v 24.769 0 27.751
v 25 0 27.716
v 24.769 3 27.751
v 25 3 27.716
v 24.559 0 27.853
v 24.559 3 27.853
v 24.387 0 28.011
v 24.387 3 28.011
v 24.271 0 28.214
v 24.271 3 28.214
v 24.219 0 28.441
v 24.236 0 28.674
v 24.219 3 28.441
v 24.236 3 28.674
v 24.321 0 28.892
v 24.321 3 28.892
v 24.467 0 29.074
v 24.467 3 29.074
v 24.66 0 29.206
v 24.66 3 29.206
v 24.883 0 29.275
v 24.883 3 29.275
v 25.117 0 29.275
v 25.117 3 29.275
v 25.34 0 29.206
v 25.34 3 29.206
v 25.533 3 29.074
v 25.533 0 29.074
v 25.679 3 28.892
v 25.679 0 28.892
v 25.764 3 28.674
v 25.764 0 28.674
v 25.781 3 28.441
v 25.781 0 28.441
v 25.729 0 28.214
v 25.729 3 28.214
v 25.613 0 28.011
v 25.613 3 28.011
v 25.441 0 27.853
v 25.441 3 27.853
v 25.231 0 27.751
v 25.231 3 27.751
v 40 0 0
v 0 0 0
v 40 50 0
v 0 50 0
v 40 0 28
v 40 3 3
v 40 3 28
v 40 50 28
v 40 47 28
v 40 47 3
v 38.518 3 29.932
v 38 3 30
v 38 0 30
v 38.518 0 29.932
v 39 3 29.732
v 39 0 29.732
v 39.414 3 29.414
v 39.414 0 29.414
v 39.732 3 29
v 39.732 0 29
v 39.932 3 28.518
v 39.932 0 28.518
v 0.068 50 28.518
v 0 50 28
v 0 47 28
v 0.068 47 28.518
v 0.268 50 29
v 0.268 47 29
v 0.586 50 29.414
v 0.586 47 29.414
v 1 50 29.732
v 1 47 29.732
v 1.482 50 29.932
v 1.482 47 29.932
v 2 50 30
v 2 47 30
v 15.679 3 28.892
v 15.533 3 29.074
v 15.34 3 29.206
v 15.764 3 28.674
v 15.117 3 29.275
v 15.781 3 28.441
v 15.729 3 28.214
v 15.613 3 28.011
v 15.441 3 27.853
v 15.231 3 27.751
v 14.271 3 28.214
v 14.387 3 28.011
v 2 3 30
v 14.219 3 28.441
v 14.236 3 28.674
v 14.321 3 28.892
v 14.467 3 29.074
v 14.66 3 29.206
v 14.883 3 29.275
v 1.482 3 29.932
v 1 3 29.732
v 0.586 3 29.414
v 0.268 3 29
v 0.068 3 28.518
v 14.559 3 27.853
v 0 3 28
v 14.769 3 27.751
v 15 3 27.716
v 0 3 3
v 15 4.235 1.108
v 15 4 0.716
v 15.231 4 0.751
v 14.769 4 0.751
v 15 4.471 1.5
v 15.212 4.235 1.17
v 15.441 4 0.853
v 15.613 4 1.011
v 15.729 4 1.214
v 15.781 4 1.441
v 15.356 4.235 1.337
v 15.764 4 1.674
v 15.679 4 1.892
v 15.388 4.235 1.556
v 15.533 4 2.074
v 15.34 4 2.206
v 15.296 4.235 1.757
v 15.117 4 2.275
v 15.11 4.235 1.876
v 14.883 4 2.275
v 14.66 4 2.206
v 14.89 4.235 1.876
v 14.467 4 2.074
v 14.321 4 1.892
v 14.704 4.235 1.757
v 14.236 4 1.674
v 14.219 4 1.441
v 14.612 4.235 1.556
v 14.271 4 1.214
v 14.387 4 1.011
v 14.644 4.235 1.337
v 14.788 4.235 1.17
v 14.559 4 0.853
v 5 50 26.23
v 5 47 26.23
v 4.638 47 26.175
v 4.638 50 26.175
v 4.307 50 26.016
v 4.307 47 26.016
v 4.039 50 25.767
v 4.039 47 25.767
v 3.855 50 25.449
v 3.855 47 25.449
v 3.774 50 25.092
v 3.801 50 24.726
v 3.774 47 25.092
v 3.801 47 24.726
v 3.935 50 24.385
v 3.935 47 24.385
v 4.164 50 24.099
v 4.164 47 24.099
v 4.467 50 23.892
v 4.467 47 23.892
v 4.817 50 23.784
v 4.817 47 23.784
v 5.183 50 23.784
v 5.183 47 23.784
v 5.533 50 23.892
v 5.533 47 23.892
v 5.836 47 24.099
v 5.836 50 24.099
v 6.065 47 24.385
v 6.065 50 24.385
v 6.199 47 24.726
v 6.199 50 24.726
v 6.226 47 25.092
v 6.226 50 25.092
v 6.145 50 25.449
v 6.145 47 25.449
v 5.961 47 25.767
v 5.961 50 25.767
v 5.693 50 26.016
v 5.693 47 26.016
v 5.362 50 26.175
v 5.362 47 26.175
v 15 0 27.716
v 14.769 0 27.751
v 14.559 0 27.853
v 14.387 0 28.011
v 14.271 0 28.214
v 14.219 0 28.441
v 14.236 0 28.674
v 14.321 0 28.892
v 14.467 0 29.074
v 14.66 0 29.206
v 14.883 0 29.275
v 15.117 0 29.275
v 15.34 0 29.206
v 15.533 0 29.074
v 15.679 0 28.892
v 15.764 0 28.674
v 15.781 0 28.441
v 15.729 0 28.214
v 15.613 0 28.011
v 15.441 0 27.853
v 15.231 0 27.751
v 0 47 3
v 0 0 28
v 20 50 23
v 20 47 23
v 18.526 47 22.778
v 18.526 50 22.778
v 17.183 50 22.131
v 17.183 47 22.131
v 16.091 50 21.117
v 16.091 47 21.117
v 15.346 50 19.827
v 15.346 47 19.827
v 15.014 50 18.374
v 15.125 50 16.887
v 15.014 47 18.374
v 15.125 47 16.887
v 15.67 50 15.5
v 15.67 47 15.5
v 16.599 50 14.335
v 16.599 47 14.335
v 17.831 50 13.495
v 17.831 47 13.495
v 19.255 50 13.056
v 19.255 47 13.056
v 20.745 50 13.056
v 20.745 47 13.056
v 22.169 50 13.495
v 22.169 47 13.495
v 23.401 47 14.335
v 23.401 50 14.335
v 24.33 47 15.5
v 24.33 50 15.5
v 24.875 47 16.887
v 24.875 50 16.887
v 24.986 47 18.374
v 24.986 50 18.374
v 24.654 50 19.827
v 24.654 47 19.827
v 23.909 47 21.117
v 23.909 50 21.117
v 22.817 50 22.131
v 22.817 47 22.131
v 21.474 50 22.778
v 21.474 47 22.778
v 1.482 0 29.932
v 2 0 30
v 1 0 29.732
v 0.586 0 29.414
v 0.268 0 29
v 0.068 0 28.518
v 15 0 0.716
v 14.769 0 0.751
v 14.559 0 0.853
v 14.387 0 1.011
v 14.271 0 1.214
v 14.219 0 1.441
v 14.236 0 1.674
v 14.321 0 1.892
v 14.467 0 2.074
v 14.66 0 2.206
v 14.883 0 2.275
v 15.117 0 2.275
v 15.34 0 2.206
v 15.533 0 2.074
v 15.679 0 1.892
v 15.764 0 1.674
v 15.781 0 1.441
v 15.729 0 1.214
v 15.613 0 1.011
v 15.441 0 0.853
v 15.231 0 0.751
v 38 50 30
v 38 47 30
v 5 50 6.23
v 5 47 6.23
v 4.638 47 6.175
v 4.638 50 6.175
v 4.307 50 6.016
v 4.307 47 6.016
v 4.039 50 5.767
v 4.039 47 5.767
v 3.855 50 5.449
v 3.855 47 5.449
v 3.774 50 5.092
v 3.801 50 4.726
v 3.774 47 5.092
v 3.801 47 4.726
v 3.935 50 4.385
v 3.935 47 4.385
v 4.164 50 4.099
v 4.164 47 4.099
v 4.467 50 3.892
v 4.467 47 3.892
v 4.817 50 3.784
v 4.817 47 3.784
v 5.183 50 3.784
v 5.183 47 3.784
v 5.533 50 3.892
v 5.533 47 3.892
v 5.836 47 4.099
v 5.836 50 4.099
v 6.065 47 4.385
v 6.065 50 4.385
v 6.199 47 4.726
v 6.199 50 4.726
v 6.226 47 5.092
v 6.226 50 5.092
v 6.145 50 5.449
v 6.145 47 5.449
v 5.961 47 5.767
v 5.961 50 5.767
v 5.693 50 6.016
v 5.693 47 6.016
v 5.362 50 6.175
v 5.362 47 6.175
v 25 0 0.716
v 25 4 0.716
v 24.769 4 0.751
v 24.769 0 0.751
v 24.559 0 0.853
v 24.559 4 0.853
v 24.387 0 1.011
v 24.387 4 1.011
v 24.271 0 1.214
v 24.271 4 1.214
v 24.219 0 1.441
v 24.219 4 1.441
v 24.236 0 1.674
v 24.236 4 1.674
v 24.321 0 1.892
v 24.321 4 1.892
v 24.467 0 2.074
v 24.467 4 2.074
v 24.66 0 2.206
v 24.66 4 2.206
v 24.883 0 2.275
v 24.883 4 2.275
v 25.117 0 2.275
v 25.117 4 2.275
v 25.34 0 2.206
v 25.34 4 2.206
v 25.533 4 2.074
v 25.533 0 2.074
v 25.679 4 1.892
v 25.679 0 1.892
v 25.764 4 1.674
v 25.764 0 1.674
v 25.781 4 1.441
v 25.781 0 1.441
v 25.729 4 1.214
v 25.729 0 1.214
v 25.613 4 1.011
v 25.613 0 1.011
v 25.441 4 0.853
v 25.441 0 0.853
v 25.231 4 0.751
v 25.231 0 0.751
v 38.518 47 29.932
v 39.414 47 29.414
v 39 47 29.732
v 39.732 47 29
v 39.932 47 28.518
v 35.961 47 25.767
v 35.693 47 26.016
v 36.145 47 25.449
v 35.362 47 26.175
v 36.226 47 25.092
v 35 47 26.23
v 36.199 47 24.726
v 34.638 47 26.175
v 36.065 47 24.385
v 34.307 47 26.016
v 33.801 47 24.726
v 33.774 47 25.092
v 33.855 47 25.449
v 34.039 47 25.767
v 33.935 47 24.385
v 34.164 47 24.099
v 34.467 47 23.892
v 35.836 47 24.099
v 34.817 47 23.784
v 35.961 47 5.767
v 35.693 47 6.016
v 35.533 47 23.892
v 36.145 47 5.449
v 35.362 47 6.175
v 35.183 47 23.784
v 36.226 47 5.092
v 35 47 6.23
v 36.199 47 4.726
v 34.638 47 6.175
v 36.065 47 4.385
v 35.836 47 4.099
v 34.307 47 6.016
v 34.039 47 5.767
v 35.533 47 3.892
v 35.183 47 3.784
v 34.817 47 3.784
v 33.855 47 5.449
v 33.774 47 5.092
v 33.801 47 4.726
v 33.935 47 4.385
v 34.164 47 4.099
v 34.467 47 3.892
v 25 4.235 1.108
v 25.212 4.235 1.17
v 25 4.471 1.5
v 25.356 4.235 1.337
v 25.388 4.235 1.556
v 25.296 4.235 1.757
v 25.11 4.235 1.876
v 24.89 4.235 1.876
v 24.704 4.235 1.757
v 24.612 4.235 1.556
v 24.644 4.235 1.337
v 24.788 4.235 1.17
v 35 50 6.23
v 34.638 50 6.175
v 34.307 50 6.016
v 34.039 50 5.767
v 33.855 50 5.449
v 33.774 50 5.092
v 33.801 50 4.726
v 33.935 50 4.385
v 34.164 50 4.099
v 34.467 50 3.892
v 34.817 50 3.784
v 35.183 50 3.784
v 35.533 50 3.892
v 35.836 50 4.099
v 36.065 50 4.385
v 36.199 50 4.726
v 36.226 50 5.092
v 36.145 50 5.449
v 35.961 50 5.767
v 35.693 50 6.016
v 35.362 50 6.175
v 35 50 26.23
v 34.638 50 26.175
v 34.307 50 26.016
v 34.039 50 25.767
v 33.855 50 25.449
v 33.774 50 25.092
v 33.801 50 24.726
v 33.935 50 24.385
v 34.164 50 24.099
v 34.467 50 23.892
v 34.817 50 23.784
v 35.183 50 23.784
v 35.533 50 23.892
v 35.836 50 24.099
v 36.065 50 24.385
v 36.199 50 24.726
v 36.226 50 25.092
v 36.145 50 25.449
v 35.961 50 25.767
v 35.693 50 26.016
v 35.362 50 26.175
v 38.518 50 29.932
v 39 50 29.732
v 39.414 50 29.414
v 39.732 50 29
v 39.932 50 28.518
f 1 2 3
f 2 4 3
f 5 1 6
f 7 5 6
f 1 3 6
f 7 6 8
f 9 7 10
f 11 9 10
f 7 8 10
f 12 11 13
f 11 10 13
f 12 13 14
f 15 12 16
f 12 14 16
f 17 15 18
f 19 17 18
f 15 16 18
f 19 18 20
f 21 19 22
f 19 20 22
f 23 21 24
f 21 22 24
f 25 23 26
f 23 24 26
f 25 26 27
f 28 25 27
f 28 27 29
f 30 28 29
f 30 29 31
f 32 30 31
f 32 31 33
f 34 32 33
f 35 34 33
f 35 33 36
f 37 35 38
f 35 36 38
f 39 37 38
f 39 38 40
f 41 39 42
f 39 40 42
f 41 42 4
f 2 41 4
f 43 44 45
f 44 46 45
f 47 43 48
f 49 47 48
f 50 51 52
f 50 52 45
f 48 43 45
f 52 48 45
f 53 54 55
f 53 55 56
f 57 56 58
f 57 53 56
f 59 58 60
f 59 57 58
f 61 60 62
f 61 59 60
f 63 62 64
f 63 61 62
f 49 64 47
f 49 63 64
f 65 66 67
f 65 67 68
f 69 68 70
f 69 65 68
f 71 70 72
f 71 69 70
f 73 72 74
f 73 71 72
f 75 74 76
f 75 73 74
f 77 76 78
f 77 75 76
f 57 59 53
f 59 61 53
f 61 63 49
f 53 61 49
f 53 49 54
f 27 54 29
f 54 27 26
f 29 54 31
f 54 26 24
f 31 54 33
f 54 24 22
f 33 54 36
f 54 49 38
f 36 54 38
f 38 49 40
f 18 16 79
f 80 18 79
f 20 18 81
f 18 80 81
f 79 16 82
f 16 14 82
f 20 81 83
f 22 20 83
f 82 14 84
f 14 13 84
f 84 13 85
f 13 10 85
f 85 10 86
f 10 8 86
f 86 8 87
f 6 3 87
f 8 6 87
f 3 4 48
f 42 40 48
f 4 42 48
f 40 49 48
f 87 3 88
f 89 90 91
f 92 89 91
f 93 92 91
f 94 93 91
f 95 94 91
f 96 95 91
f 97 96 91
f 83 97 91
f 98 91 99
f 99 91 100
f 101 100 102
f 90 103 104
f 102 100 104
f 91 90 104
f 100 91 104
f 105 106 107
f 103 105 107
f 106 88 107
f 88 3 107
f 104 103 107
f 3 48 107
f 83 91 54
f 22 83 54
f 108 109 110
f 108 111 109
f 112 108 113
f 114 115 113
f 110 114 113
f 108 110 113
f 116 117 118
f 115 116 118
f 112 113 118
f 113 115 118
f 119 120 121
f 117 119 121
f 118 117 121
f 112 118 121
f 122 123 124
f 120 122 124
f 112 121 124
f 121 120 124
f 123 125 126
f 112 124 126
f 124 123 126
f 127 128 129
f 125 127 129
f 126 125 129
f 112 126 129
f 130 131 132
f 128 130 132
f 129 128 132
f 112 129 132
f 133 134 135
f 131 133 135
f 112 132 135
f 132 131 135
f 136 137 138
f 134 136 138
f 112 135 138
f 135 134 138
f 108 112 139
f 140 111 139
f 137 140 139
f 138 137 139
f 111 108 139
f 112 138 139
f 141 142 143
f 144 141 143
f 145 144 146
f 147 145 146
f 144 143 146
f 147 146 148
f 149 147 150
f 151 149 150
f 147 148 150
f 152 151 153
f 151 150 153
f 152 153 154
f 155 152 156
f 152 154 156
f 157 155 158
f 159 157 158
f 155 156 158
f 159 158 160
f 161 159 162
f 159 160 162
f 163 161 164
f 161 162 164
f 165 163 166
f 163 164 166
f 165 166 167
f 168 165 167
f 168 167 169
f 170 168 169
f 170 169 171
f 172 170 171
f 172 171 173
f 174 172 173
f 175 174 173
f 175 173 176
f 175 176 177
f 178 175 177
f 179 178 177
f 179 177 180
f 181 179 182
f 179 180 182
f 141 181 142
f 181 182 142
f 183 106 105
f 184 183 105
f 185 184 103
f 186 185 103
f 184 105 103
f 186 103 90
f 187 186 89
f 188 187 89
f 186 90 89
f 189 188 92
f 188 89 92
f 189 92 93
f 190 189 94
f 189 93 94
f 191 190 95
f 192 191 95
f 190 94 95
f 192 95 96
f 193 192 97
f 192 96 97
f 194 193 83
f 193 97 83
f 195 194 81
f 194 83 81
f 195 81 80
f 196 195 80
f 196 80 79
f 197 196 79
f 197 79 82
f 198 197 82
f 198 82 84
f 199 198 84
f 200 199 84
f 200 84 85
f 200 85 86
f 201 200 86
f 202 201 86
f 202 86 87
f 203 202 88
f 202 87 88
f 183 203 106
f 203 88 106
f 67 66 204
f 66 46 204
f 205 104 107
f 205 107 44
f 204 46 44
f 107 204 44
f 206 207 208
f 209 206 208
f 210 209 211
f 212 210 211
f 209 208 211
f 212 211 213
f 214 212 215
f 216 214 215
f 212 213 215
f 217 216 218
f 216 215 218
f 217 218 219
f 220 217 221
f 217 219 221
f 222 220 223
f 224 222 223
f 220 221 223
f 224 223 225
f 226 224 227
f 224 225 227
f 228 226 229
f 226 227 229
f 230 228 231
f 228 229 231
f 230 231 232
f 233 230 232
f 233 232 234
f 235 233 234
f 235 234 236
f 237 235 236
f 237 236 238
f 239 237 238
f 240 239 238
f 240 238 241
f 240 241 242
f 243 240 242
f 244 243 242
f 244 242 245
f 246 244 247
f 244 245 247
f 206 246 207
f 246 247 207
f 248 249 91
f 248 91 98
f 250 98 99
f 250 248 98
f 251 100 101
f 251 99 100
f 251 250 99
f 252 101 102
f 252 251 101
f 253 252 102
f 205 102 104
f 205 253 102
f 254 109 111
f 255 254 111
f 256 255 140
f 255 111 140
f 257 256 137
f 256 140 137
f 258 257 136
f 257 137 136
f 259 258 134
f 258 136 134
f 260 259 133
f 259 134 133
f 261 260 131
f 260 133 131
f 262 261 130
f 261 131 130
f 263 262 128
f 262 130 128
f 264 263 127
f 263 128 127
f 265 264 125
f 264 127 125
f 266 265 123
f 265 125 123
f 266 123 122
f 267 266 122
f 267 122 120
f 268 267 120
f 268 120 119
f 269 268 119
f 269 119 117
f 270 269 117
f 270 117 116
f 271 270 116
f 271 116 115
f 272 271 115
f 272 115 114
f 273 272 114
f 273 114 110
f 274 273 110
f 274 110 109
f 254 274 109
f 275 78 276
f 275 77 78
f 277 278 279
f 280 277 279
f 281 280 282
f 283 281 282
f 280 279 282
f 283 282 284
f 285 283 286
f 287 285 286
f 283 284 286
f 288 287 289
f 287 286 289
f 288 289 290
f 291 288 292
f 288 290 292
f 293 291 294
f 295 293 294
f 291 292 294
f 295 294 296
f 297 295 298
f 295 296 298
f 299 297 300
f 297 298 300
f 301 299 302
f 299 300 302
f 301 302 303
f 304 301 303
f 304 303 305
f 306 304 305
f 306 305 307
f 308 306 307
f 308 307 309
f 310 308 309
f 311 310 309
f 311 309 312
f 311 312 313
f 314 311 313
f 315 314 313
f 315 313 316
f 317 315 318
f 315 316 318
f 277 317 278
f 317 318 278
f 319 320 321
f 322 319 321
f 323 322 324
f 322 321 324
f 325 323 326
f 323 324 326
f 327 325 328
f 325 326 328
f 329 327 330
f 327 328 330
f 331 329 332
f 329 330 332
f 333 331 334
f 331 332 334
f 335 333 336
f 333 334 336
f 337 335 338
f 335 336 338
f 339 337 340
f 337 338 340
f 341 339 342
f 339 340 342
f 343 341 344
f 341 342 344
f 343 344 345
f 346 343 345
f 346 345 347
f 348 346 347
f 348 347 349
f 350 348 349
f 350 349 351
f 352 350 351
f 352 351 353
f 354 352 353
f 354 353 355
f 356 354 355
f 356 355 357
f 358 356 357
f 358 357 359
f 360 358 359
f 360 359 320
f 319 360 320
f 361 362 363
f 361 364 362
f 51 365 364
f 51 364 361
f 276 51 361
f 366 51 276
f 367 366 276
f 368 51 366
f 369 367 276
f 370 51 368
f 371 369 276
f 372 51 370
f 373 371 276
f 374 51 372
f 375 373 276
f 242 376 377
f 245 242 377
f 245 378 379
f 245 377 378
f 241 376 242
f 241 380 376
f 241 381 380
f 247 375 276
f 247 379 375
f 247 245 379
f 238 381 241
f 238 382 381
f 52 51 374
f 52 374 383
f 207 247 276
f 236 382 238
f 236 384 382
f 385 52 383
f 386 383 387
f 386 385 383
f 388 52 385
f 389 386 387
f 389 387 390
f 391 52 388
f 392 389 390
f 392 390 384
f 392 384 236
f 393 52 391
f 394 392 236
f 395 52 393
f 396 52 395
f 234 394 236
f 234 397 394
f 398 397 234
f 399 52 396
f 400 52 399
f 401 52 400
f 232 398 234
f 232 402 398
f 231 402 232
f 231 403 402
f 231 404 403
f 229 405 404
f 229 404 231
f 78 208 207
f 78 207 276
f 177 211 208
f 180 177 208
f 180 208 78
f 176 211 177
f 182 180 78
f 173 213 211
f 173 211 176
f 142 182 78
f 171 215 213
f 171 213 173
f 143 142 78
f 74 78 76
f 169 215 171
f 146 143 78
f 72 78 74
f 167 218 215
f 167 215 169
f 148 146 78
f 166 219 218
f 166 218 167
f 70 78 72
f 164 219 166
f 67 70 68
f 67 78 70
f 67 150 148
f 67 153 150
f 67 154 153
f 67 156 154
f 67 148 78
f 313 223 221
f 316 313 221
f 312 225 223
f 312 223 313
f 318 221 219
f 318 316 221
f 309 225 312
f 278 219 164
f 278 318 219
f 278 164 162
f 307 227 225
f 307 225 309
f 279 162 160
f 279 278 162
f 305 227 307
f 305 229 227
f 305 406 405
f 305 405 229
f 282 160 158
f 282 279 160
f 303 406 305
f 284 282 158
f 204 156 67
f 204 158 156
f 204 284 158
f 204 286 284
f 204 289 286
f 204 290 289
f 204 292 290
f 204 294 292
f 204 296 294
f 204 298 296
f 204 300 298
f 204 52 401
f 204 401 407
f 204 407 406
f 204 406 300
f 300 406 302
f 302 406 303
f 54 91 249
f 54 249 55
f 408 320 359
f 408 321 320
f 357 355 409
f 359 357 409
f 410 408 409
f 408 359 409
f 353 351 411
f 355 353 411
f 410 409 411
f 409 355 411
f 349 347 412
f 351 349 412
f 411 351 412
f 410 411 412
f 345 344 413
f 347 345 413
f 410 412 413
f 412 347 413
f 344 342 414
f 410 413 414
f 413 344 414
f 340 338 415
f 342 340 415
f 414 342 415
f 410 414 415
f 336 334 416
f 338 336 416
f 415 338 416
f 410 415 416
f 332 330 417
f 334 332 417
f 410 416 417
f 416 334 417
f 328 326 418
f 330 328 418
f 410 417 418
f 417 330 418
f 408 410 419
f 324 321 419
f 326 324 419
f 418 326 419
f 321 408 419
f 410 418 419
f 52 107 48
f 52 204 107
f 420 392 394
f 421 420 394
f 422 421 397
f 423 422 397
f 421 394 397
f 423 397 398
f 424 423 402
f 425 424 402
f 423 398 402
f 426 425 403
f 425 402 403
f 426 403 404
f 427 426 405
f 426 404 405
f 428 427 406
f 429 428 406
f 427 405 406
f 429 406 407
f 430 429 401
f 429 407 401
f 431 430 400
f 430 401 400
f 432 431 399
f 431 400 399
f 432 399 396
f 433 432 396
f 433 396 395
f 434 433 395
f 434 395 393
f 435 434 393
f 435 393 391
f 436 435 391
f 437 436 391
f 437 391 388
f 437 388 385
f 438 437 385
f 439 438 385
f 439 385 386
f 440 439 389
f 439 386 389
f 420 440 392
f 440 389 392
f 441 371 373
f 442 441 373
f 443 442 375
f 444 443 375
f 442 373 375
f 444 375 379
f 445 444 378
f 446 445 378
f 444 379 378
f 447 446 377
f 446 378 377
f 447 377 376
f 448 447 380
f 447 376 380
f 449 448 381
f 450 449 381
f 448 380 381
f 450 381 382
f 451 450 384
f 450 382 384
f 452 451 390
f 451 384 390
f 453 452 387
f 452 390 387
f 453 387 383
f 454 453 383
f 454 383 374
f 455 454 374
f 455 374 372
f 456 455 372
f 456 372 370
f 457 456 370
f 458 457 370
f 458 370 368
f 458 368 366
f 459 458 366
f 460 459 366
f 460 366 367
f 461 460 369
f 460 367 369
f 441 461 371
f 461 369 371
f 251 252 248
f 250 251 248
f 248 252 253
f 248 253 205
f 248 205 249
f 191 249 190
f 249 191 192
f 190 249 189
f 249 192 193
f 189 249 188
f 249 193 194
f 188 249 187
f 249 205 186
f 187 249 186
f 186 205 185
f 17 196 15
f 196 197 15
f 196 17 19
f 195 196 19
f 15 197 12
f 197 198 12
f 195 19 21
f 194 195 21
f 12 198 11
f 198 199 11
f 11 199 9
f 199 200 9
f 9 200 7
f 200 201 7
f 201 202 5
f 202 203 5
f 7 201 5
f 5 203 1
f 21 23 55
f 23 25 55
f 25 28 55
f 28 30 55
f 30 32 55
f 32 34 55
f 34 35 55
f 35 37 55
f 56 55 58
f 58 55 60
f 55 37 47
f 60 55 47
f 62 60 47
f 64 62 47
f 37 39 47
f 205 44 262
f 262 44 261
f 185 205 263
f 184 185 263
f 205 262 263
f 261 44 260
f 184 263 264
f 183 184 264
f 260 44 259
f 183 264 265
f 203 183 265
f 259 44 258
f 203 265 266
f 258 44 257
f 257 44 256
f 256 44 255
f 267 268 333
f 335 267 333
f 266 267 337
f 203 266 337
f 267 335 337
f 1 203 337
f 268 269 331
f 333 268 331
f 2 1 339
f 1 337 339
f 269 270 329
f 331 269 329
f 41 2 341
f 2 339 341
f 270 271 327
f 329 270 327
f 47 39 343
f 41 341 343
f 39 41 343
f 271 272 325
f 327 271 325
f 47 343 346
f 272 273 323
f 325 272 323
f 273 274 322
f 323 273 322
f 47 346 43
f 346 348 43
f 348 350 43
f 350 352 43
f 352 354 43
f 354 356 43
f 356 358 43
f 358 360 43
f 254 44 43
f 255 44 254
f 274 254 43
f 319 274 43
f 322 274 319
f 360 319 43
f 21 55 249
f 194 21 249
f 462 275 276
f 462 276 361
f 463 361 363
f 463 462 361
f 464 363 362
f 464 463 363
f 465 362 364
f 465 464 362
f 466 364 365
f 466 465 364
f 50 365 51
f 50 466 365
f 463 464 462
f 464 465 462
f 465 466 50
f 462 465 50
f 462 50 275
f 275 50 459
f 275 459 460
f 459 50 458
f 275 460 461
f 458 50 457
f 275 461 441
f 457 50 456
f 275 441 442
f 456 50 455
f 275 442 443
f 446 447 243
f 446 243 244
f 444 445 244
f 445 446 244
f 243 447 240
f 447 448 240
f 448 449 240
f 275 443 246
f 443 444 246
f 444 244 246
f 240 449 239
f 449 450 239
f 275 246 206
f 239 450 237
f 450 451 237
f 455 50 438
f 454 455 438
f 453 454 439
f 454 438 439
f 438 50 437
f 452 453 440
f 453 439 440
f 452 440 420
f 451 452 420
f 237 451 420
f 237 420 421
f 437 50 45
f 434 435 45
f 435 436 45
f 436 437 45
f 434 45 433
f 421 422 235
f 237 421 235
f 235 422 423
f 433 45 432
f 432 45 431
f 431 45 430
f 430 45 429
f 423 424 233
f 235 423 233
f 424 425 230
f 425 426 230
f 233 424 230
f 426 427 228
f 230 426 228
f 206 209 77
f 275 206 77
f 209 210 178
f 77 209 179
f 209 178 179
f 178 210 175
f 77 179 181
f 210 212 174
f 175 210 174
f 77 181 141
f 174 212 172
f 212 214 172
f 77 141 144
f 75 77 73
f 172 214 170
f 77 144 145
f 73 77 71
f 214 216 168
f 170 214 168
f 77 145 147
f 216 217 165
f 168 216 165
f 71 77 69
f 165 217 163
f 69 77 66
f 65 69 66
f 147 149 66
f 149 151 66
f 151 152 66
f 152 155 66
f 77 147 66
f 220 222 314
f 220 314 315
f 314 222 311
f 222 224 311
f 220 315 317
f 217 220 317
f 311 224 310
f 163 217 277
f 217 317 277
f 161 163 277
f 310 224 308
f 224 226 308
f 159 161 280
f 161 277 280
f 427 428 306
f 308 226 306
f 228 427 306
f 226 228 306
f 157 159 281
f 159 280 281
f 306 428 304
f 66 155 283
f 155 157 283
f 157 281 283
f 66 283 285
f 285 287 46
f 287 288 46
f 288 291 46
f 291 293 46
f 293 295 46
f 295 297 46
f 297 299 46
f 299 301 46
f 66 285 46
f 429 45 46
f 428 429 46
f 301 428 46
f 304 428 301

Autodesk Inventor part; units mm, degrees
ref_plane "YZ Plane" through (0, 0, 0) normal (1, 0, 0) x (0, 1, 0)
ref_plane "XZ Plane" through (0, 0, 0) normal (0, 1, 0) x (-1, 0, 0)
ref_plane "XY Plane" through (0, 0, 0) normal (0, 0, 1) x (1, 0, 0)
sketch "スケッチ1" plane through (0, 0, 0) normal (0, 0, 1) x (1, 0, 0)
  line L0 (0, 0) -> (40, 0)
  line L1 (40, 0) -> (40, 50)
  line L2 (40, 50) -> (0, 50)
  line L3 (0, 50) -> (0, 0)
  dimension "d0" = 40
  dimension "d1" = 50
extrude "押し出し1" add sketch "スケッチ1" along normal blind 3
sketch "スケッチ2" plane through (0, 0, 3) normal (0, 0, 1) x (1, 0, 0)
  line L0 (40, 50) -> (0, 50) projected
  line L1 (40, 0) -> (40, 50) projected
  line L2 (0, 50) -> (40, 50)
  line L3 (40, 50) -> (40, 47)
  line L4 (40, 47) -> (0, 47)
  line L5 (0, 47) -> (0, 50)
  line L6 (0, 50) -> (0, 0) projected
  line L7 (0, 0) -> (40, 0)
  line L8 (40, 0) -> (40, 3)
  line L9 (40, 3) -> (0, 3)
  line L10 (0, 3) -> (0, 0)
  point P0 (0, 3)
  dimension "d5" = 3
  dimension "d6" = 3
extrude "押し出し2" add sketch "スケッチ2" along normal blind 27 contours L1 L4 L5 L0 | L1 L7 L6 L9
sketch "スケッチ3" plane through (0, 50, 0) normal (0, 1, 0) x (1, 0, 0)
  line L0 (0, 0) -> (0, -30) projected
  line L1 (40, 0) -> (0, 0) projected
  point P0 (20, -18)
  dimension "d9" = 20
  dimension "d10" = 18
hole "穴1" at (20, 50, 18) direction (0, -1, 0) diameter 10 depth 3
sketch "スケッチ5" plane through (0, 0, 0) normal (0, -1, 0) x (1, 0, 0)
  line L0 (40, 0) -> (40, 30) projected
  line L1 (40, 15) -> (0, 15)
  line L2 (0, 3) -> (0, 30) projected
  line L3 (0, 0) -> (40, 0) projected
  line L4 (20, 0) -> (20, 30)
  line L5 (0, 30) -> (40, 30) projected
  point P0 (25, 1.5)
  point P1 (15, 1.5)
  point P2 (25, 28.5)
  point P3 (15, 28.5)
  dimension "d18" = 10
  dimension "d19" = 27
hole "穴2" at (25, 0, 1.5) at (15, 0, 1.5) at (25, 0, 28.5) at (15, 0, 28.5) direction (0, 1, 0) diameter 1.567 depth 4 tip angle 118 thread size "M2x0.4" class "6H" standard "ISO Metric profile"
sketch "スケッチ6" plane through (0, 50, 0) normal (0, 1, 0) x (1, 0, 0)
  line L0 (40, 0) -> (0, 0) projected
  line L1 (20, 0) -> (20, -30)
  line L2 (40, -30) -> (0, -30) projected
  line L3 (0, 0) -> (0, -30) projected
  line L4 (0, -15) -> (40, -15)
  line L5 (40, 0) -> (40, -30) projected
  point P0 (5, -5)
  point P1 (35, -5)
  point P2 (5, -25)
  point P3 (35, -25)
  dimension "d27" = 20
  dimension "d28" = 30
hole "穴3" at (5, 50, 5) at (35, 50, 5) at (5, 50, 25) at (35, 50, 25) direction (0, -1, 0) diameter 2.459 depth 3 thread size "M3x0.5" class "6H" standard "ISO Metric profile"
fillet "フィレット1" radius 2 4 edges at (0, 48.5, 30) (0, 1.5, 30) (40, 48.5, 30) (40, 1.5, 30)
properties part number "arm" material "アルミニウム 6061"
